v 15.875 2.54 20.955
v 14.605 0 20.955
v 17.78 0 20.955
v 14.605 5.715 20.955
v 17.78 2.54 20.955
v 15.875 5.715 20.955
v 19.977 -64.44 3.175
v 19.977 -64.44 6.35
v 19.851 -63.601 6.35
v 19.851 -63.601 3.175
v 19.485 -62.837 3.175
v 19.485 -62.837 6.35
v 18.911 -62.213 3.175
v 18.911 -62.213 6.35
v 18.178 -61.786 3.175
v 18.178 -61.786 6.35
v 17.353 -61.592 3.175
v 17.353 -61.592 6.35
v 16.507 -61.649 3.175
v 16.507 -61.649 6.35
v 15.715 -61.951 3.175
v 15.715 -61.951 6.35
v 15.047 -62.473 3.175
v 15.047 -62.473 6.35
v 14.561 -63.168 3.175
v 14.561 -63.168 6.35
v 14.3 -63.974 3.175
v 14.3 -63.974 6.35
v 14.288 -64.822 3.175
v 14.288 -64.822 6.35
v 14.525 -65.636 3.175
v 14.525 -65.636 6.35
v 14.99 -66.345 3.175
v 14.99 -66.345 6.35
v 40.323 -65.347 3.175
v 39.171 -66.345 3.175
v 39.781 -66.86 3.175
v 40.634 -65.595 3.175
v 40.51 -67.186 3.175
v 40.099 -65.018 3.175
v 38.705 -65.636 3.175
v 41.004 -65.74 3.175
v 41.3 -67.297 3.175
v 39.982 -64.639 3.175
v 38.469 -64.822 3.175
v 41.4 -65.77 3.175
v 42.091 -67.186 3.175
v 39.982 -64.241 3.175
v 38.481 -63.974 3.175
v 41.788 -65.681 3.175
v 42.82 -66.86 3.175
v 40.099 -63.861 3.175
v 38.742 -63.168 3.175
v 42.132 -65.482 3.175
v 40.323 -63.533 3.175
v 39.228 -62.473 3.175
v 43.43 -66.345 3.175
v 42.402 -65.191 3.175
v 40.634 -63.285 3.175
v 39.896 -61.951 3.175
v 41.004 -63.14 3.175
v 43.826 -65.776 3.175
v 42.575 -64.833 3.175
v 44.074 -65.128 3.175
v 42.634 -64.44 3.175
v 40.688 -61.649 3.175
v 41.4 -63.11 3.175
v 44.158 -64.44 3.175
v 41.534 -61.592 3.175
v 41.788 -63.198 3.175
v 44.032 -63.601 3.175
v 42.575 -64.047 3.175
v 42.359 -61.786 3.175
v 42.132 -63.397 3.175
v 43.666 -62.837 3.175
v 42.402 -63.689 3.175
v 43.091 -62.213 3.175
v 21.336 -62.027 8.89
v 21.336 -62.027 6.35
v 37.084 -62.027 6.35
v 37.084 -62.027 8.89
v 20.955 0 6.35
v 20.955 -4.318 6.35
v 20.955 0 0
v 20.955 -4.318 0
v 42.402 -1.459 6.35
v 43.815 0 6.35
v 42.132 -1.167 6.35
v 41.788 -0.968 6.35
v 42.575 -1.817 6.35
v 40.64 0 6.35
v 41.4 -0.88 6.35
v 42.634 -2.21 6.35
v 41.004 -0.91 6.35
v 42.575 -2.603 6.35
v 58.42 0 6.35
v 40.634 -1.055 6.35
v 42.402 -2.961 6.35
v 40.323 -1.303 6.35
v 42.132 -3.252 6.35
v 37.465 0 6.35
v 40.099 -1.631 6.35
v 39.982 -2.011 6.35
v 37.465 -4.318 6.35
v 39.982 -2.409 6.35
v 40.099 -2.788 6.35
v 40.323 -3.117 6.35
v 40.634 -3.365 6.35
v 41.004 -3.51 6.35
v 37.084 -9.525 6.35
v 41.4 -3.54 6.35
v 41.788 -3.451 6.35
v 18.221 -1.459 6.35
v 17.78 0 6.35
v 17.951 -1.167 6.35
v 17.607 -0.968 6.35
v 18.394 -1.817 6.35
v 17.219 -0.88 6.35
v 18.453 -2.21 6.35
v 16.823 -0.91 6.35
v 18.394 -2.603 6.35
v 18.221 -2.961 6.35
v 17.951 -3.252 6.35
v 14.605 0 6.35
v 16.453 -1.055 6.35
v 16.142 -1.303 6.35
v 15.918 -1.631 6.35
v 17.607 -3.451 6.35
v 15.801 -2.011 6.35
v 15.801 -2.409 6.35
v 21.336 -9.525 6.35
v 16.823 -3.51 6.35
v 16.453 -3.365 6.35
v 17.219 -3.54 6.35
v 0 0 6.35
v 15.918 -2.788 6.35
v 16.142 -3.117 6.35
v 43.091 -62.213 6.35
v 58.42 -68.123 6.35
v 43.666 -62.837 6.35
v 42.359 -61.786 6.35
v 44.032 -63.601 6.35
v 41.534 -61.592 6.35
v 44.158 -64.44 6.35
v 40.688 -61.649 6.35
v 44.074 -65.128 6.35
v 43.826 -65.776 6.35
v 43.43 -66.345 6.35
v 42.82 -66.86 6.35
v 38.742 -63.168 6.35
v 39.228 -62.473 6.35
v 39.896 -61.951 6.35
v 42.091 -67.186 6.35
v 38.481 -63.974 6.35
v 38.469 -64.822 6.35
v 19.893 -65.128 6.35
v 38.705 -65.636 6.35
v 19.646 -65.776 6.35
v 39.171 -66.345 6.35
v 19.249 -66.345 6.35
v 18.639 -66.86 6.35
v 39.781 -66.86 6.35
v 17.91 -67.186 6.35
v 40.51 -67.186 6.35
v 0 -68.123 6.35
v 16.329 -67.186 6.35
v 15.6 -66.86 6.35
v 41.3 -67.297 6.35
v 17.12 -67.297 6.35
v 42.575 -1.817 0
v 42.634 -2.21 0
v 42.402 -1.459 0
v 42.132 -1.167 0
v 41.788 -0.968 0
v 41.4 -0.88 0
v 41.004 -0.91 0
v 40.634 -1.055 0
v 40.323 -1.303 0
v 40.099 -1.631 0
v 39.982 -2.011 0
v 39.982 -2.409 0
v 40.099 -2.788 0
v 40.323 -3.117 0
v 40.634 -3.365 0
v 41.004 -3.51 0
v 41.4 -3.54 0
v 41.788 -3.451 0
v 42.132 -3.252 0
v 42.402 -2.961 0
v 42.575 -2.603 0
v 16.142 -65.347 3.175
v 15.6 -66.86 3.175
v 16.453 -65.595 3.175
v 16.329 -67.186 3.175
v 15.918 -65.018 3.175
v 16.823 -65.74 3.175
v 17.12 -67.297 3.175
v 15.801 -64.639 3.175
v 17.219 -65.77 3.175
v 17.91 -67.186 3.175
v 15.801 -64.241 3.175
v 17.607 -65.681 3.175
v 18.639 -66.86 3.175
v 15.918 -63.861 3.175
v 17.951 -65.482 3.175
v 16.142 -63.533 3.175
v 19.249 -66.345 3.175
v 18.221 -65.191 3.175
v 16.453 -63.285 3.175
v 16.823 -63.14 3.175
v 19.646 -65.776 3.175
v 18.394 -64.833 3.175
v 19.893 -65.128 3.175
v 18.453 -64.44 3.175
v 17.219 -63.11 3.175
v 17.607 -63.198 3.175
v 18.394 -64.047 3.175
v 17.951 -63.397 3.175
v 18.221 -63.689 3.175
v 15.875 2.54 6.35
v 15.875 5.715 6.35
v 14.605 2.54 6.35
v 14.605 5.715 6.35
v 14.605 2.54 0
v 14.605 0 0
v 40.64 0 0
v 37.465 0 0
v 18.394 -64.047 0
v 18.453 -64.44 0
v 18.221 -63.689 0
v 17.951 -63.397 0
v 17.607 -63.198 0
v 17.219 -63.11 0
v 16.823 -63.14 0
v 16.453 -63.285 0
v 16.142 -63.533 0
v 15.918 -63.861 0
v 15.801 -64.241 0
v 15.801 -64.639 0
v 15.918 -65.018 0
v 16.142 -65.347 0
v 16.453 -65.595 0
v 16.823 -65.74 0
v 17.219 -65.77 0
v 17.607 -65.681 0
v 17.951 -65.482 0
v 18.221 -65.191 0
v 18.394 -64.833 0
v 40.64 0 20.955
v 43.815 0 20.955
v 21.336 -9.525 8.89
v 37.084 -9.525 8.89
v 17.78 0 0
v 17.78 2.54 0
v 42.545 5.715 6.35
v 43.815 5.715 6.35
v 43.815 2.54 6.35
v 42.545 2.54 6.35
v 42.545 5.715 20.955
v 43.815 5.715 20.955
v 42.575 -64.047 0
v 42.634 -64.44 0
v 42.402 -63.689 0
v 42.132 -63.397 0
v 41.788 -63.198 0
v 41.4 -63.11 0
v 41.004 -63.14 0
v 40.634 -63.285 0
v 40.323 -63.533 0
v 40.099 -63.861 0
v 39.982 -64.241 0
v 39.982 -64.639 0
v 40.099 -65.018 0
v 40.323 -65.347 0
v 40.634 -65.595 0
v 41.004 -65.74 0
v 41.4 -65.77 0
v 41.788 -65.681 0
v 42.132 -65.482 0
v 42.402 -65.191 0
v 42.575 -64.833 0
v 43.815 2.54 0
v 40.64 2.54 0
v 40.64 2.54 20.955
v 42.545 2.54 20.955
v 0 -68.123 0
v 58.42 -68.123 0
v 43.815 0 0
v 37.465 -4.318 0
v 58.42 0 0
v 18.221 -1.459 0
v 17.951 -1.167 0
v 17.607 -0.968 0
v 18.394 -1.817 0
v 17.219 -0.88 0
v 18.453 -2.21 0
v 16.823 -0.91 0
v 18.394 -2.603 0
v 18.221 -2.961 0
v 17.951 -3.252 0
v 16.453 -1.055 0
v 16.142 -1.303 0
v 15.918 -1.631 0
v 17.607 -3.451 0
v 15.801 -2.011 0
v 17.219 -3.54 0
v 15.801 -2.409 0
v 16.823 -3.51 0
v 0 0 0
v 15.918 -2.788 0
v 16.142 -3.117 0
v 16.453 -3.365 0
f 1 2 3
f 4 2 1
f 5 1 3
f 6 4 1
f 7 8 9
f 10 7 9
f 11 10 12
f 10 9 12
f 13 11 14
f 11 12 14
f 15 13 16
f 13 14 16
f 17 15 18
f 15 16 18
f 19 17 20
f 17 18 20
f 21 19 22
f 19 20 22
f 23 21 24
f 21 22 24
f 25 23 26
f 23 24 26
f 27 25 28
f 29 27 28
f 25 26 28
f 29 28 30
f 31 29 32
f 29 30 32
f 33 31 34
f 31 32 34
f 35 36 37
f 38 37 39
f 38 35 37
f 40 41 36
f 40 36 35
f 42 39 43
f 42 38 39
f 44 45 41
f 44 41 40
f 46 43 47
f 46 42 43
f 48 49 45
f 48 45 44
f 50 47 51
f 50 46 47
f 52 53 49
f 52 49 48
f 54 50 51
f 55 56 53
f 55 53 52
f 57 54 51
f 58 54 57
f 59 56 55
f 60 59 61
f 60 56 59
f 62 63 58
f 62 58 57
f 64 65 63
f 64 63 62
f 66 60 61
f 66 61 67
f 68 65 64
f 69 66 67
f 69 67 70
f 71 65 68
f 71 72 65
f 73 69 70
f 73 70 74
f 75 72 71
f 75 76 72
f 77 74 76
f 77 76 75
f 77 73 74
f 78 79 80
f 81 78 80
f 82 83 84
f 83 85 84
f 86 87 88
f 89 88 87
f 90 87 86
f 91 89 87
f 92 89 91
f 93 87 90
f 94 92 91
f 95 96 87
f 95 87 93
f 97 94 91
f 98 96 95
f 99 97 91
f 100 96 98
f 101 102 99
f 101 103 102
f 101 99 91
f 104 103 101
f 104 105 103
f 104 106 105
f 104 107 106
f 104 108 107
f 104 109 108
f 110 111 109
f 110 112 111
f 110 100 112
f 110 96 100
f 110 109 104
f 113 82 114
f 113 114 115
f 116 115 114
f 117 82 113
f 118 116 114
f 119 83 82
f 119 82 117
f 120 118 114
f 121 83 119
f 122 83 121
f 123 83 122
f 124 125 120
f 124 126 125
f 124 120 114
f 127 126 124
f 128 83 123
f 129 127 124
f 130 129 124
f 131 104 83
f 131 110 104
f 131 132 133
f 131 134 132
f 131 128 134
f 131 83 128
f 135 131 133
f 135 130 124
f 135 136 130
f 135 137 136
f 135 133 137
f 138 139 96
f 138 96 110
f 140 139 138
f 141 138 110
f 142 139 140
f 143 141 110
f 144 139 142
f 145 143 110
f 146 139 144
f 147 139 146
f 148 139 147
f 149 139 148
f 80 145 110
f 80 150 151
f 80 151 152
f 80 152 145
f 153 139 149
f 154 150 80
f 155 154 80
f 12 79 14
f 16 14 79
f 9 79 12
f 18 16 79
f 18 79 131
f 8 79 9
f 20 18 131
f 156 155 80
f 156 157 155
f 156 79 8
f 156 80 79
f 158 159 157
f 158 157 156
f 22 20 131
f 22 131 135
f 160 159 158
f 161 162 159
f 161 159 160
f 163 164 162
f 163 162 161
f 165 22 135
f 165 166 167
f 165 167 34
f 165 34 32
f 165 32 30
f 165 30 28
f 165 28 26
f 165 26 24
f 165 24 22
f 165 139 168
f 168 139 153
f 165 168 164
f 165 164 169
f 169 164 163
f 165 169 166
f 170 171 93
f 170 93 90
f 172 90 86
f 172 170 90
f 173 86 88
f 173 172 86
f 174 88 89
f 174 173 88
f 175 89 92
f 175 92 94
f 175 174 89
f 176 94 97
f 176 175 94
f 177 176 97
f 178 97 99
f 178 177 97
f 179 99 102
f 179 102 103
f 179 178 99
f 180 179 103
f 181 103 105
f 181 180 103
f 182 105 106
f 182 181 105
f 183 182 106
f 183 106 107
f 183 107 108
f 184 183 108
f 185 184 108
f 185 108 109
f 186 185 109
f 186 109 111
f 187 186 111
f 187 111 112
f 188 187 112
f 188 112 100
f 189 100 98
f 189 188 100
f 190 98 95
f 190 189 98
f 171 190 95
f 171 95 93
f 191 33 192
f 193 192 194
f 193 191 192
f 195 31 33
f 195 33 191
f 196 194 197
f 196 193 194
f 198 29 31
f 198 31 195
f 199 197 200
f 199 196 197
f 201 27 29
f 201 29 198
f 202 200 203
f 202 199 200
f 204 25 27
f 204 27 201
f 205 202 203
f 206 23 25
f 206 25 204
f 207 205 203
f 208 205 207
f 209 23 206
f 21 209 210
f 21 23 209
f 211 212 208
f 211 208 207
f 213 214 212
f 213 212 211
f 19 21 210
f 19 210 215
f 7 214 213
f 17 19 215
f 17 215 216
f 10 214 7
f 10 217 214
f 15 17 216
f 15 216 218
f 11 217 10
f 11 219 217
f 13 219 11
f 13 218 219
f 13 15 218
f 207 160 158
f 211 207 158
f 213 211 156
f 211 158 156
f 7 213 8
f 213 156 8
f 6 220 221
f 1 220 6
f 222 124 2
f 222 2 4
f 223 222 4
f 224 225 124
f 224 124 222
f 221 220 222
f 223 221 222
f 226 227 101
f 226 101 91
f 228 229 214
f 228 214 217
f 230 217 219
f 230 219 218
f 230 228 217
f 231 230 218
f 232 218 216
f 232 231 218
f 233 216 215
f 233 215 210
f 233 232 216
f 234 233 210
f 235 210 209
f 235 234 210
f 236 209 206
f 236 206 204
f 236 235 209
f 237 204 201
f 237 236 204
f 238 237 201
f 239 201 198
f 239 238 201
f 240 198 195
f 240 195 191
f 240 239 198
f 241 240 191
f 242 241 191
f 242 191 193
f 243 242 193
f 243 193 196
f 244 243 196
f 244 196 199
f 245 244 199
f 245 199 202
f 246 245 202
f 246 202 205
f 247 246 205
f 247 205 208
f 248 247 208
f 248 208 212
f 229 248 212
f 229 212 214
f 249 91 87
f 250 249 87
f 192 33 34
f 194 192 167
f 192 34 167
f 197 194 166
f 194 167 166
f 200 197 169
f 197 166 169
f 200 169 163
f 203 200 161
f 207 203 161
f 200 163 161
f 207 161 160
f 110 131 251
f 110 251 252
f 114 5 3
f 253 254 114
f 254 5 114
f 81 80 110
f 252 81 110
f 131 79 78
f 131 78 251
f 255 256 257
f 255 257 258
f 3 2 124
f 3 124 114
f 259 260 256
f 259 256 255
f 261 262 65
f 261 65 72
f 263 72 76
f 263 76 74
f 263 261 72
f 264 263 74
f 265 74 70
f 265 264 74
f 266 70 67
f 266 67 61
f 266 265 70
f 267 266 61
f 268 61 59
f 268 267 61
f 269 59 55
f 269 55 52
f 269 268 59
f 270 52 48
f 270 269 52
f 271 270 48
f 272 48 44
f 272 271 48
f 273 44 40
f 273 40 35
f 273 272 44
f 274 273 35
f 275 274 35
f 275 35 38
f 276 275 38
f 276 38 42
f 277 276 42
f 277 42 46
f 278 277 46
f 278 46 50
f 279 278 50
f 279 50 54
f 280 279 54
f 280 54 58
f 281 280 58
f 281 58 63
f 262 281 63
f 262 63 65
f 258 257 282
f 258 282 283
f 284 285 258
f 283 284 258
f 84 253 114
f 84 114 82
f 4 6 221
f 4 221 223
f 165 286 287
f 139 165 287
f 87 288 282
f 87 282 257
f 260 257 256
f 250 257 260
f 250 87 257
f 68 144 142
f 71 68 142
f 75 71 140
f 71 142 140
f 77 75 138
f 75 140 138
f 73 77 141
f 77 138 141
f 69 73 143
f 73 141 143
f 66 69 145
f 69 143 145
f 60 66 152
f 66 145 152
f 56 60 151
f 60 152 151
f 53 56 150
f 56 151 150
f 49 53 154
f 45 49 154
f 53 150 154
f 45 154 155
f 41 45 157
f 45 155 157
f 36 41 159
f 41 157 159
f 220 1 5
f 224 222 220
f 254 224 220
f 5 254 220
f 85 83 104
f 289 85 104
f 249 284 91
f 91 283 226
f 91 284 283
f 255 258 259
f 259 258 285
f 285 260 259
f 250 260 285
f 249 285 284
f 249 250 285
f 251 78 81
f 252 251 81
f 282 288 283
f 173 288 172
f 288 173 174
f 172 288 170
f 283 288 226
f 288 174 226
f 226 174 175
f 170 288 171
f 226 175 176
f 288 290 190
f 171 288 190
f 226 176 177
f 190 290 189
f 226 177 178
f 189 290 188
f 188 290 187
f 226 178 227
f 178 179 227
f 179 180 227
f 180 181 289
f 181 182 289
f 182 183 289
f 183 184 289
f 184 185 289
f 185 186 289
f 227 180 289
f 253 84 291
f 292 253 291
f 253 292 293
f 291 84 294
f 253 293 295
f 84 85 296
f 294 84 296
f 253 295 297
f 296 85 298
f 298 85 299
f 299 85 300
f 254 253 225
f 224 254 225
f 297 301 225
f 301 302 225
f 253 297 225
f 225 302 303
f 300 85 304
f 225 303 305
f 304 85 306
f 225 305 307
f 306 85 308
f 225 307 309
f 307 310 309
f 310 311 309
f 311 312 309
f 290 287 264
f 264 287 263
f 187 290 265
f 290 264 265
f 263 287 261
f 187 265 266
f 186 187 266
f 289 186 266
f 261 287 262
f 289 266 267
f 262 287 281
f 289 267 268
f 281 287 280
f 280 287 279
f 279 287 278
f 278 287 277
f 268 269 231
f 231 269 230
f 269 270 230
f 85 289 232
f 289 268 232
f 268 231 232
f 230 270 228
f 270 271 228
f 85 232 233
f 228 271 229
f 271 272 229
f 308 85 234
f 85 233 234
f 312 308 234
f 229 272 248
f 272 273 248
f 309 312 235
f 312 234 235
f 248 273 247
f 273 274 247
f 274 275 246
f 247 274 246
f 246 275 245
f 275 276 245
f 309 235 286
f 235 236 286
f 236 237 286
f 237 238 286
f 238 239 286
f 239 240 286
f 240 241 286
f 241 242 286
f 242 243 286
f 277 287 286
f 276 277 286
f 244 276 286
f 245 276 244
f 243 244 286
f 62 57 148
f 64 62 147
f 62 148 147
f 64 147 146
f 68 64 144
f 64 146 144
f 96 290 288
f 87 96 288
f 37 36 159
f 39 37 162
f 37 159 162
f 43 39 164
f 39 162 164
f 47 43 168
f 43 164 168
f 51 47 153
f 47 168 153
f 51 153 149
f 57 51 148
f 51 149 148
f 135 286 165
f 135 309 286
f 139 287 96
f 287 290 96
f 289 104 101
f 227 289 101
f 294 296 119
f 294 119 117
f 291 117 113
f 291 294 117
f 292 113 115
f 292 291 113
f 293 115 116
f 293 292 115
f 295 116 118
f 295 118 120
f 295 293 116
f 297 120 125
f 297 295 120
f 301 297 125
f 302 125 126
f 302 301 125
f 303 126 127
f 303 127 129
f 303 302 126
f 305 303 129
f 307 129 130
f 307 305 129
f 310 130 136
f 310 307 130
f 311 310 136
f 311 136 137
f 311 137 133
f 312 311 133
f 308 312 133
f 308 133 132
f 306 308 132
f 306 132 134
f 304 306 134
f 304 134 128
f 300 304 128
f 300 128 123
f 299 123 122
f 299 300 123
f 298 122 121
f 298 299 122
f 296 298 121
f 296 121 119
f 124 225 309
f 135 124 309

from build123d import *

# Parameters (mm, degrees)
F0_R      = 1.3335
F1_DEPTH  = 6.35
F2_W      = 16.51
F2_H      = 4.318
F3_DEPTH  = 6.351
F5_DEPTH  = 1.778
F6_DEPTH  = 6.604
F7_DEPTH  = 3.429
F4_W      = 15.748
F4_H      = 52.5018
F8_DEPTH  = 2.54
F9_W      = 6.35
F9_H      = 6.35
F10_W     = 6.35
F10_H     = 6.35
F11_DEPTH = 2.54
F12_W     = 6.35
F12_H     = 2.54
F13_DEPTH = 14.605
F14_W     = 3.175
F14_H     = 2.54
F15_DEPTH = 20.956
F16_W     = 1.27
F16_H     = 14.605
F17_W     = 1.27
F17_H     = 14.605
F18_DEPTH = 3.175


with BuildPart() as f1:
    # F0 (on Top) → F1 (new body)
    with BuildSketch(Plane.XY):
        with BuildLine():
            Line((58.42, 0), (0, 0))
            Line((0, 0), (0, -66.3448))
            Line((0, -66.3448), (14.9897452514, -66.3448))
            ThreePointArc((14.9897452514, -66.3448), (16.0999808785, -61.7704024843), (19.9771, -64.4398))
            ThreePointArc((19.9771, -64.4398), (19.7889975157, -65.4594191215), (19.2494547486, -66.3448))
            Line((19.2494547486, -66.3448), (39.1705452514, -66.3448))
            ThreePointArc((39.1705452514, -66.3448), (40.2807808785, -61.7704024843), (44.1579, -64.4398))
            ThreePointArc((44.1579, -64.4398), (43.9697975157, -65.4594191215), (43.4302547486, -66.3448))
            Line((43.4302547486, -66.3448), (58.42, -66.3448))
            Line((58.42, -66.3448), (58.42, 0))
        make_face()
        with Locations((17.1196, -2.2098)):
            Circle(F0_R, mode=Mode.SUBTRACT)
        with Locations((41.3004, -2.2098)):
            Circle(F0_R, mode=Mode.SUBTRACT)
        with BuildLine():
            ThreePointArc((19.9771, -64.4398), (16.0999808785, -61.7704024843), (14.9897452514, -66.3448))
            Line((14.9897452514, -66.3448), (19.2494547486, -66.3448))
            ThreePointArc((19.2494547486, -66.3448), (19.7889975157, -65.4594191215), (19.9771, -64.4398))
        make_face()
        with Locations((17.1196, -64.4398)):
            Circle(F0_R, mode=Mode.SUBTRACT)
        with BuildLine():
            Line((39.1705452514, -66.3448), (43.4302547486, -66.3448))
            ThreePointArc((43.4302547486, -66.3448), (43.9697975157, -65.4594191215), (44.1579, -64.4398))
            ThreePointArc((44.1579, -64.4398), (40.2807808785, -61.7704024843), (39.1705452514, -66.3448))
        make_face()
        with Locations((41.3004, -64.4398)):
            Circle(F0_R, mode=Mode.SUBTRACT)
    extrude(amount=F1_DEPTH)

    # F2 (on face) → F3 (cut, through all)
    with BuildSketch(Plane.XY.offset(6.35)):
        with Locations((29.21, -2.159)):
            Rectangle(F2_W, F2_H)
    extrude(amount=-F3_DEPTH, mode=Mode.SUBTRACT)

    # F5 (add): a face of the model
    f5_faces = [f1.faces().sort_by_distance(p)[0] for p in [
        (29.21, -66.3448, 3.175),
    ]]
    extrude(f5_faces, amount=F5_DEPTH)

    # F0 (on Top) → F6 (join)
    with BuildSketch(Plane.XY):
        with BuildLine():
            Line((39.1705452514, -66.3448), (43.4302547486, -66.3448))
            ThreePointArc((43.4302547486, -66.3448), (43.9697975157, -65.4594191215), (44.1579, -64.4398))
            ThreePointArc((44.1579, -64.4398), (40.2807808785, -61.7704024843), (39.1705452514, -66.3448))
        make_face()
        with Locations((41.3004, -64.4398)):
            Circle(F0_R, mode=Mode.SUBTRACT)
        with BuildLine():
            ThreePointArc((19.9771, -64.4398), (16.0999808785, -61.7704024843), (14.9897452514, -66.3448))
            Line((14.9897452514, -66.3448), (19.2494547486, -66.3448))
            ThreePointArc((19.2494547486, -66.3448), (19.7889975157, -65.4594191215), (19.9771, -64.4398))
        make_face()
        with Locations((17.1196, -64.4398)):
            Circle(F0_R, mode=Mode.SUBTRACT)
        with BuildLine():
            Line((19.2494547486, -66.3448), (14.9897452514, -66.3448))
            ThreePointArc((14.9897452514, -66.3448), (17.1196, -67.2973), (19.2494547486, -66.3448))
        make_face()
        with BuildLine():
            ThreePointArc((39.1705452514, -66.3448), (41.3004, -67.2973), (43.4302547486, -66.3448))
            Line((43.4302547486, -66.3448), (39.1705452514, -66.3448))
        make_face()
    extrude(amount=F6_DEPTH)

    # F7 (cut): faces of the model
    f7_faces = [f1.faces().sort_by_distance(p)[0] for p in [
        (19.1892133591, -62.5886815367, 6.604),
        (43.3700133591, -62.5886815367, 6.604),
    ]]
    extrude(f7_faces, amount=-F7_DEPTH, mode=Mode.SUBTRACT)

    # F4 (on face) → F8 (join)
    with BuildSketch(Plane.XY.offset(6.35)):
        with Locations((29.21, -35.7759)):
            Rectangle(F4_W, F4_H)
    extrude(amount=F8_DEPTH)

    # F9 (on face) + F10 (on face) → F11 (join)
    with BuildSketch(Plane(origin=(0, 0, 0), x_dir=(-1, 0, 0), z_dir=(0, 1, 0))):
        with Locations((-17.78, 3.175)):
            Rectangle(F9_W, F9_H)
    with BuildSketch(Plane(origin=(0, 0, 0), x_dir=(-1, 0, 0), z_dir=(0, 1, 0))):
        with Locations((-40.64, 3.175)):
            Rectangle(F10_W, F10_H)
    extrude(amount=F11_DEPTH)

    # F12 (on face) → F13 (join)
    with BuildSketch(Plane.XY.offset(6.35)):
        with Locations((17.78, 1.27)):
            Rectangle(F12_W, F12_H)
        with Locations((40.64, 1.27)):
            Rectangle(F12_W, F12_H)
    extrude(amount=F13_DEPTH)

    # F14 (on face) → F15 (cut, through all)
    with BuildSketch(Plane(origin=(0, 0, 0), x_dir=(1, 0, 0), z_dir=(0, 0, -1))):
        with Locations((19.3675, -1.27)):
            Rectangle(F14_W, F14_H)
        with Locations((39.0525, -1.27)):
            Rectangle(F14_W, F14_H)
    extrude(amount=-F15_DEPTH, mode=Mode.SUBTRACT)

    # F16 (on face) + F17 (on face) → F18 (join)
    with BuildSketch(Plane(origin=(0, 2.54, 0), x_dir=(-1, 0, 0), z_dir=(0, 1, 0))):
        with Locations((-43.18, 13.6525)):
            Rectangle(F16_W, F16_H)
    with BuildSketch(Plane(origin=(0, 2.54, 0), x_dir=(-1, 0, 0), z_dir=(0, 1, 0))):
        with Locations((-15.24, 13.6525)):
            Rectangle(F17_W, F17_H)
    extrude(amount=F18_DEPTH)


solid = f1.part
